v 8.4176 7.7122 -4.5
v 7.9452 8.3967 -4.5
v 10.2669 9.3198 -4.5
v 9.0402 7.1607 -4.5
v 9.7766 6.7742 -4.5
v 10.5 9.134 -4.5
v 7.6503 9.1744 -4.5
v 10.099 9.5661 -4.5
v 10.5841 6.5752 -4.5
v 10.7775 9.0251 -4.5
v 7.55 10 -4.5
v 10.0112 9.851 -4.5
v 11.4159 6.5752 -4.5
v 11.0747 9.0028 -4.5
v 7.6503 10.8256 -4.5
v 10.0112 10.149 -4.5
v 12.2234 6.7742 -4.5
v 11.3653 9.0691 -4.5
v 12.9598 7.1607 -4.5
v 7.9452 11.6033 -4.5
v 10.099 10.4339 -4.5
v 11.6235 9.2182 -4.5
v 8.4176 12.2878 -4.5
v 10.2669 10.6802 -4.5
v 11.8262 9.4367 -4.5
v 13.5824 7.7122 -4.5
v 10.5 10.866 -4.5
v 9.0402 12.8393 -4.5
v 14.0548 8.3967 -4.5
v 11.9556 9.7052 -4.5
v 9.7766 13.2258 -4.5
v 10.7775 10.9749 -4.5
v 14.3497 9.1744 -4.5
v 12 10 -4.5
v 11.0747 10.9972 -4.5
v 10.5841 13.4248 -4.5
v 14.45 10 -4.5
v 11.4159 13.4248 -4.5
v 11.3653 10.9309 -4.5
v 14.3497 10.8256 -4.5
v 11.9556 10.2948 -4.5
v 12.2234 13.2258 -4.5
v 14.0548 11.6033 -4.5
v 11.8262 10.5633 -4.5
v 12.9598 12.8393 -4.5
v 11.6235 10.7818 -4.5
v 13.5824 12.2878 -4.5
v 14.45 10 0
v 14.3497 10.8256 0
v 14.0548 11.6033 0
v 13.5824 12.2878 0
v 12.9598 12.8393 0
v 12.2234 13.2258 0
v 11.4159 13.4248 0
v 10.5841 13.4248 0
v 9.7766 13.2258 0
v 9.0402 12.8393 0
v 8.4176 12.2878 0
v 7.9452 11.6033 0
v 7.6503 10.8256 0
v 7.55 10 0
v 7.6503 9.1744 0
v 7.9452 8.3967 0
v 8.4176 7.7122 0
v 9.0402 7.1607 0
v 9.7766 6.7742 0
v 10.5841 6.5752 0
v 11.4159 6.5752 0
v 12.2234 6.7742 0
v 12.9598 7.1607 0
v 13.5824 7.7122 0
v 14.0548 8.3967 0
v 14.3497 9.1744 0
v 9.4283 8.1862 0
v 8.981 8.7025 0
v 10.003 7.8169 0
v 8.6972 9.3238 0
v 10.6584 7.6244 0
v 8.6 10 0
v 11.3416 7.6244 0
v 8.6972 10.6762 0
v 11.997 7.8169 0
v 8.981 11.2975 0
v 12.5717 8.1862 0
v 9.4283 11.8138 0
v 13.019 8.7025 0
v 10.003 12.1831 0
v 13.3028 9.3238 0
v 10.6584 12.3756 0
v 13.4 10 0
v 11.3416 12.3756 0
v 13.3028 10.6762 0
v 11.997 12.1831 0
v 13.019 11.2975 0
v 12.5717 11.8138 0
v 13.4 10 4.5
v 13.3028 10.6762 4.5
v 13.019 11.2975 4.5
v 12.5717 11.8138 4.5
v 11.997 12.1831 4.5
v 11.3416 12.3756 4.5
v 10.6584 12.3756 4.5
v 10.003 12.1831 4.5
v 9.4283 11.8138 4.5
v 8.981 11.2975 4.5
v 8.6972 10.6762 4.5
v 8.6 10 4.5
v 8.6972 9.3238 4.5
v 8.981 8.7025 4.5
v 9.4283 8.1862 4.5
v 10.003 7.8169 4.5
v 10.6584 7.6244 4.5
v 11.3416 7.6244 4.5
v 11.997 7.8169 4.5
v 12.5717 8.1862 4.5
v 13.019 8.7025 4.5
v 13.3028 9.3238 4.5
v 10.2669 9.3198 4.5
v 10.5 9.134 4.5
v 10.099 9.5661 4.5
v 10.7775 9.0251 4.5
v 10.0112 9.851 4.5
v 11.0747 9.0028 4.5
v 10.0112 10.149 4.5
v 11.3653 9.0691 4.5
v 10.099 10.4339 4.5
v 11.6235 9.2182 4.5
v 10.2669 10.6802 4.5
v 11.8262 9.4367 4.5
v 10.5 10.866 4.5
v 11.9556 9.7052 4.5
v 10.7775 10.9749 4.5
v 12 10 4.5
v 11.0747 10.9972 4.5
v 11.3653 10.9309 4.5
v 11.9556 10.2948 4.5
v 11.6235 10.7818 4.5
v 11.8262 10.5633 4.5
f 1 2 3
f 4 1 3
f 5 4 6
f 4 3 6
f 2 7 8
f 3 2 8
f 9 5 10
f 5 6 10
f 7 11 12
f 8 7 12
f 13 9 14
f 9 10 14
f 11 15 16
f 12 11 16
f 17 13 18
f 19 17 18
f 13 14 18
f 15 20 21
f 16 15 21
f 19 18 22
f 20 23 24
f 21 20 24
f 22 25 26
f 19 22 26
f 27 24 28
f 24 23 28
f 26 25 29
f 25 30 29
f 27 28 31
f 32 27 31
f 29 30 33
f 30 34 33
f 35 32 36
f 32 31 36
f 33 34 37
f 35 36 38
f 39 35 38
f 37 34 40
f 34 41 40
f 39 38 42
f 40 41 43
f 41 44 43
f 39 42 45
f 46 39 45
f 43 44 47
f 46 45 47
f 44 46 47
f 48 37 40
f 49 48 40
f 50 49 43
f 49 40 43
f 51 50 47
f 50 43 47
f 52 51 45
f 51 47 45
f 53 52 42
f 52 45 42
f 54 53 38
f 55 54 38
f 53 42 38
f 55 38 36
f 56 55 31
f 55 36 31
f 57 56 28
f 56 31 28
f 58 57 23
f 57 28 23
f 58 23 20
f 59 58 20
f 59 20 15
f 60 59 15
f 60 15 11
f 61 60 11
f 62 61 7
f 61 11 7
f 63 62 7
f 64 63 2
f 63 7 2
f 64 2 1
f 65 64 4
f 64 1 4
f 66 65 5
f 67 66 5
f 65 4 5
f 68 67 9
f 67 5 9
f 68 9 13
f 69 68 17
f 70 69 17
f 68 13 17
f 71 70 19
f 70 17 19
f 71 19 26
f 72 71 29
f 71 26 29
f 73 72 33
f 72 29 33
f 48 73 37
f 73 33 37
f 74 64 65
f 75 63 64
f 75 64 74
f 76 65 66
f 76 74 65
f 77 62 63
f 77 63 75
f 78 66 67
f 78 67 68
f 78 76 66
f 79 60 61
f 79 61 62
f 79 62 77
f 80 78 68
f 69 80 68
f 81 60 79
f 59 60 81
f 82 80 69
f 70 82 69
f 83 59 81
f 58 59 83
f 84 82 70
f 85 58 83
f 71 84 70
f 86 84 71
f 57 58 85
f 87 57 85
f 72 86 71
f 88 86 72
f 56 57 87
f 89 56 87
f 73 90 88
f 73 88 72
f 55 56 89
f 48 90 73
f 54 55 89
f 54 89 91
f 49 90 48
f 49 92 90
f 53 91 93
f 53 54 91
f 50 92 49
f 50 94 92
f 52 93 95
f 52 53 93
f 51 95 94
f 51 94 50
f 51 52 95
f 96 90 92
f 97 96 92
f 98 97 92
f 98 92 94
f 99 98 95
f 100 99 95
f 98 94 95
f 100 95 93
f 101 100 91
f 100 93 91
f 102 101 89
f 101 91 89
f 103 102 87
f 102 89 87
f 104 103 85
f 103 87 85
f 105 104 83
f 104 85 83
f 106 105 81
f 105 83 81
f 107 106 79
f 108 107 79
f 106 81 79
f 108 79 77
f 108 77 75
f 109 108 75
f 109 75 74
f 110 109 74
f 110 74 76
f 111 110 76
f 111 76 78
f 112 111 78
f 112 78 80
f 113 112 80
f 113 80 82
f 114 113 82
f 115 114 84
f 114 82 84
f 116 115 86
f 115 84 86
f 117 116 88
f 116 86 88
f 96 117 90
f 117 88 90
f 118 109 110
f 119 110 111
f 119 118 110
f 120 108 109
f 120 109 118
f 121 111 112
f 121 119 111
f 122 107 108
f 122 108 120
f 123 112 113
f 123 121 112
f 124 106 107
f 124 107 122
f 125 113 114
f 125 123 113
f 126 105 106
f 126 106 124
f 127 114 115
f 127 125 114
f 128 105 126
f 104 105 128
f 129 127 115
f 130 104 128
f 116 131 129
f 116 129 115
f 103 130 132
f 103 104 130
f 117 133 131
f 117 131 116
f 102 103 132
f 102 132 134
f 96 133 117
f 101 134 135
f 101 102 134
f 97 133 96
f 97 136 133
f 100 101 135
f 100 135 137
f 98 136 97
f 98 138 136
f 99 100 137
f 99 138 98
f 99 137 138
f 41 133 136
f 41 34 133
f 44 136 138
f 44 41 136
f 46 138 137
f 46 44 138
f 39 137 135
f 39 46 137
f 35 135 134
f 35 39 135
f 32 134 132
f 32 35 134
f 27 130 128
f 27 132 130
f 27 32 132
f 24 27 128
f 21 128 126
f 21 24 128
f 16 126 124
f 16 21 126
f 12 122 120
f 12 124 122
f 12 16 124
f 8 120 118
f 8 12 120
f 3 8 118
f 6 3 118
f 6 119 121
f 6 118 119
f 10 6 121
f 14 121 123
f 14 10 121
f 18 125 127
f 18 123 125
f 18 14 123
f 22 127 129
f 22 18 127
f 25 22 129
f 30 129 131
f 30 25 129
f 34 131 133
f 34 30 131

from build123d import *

# Parameters (mm, degrees)
CYLINDER003006_R     = 1
CYLINDER003006_DEPTH = 20
CYLINDER003003_R     = 2.4
CYLINDER003003_DEPTH = 4.5
CYLINDER003005_R     = 3.45
CYLINDER003005_DEPTH = 4.5


with BuildPart() as cylinder007:
    # Cylinder003006 → Cylinder003006 (new body)
    with BuildSketch(Plane(origin=(11, 10, -8), x_dir=(1, 0, 0), z_dir=(0, 0, 1))):
        Circle(CYLINDER003006_R)
    extrude(amount=CYLINDER003006_DEPTH)


with BuildPart() as cut002002002013:
    # Cylinder003003 → Cylinder003003 (new body)
    with BuildSketch(Plane(origin=(11, 10, -0.5), x_dir=(1, 0, 0), z_dir=(0, 0, 1))):
        Circle(CYLINDER003003_R)
    extrude(amount=CYLINDER003003_DEPTH)

    # Cut002002002013: cut Cylinder007
    add(cylinder007.part, mode=Mode.SUBTRACT)


with BuildPart() as propeller_hub_old:
    # Cylinder003005 → Cylinder003005 (new body)
    with BuildSketch(Plane(origin=(11, 10, -5), x_dir=(1, 0, 0), z_dir=(0, 0, 1))):
        Circle(CYLINDER003005_R)
    extrude(amount=CYLINDER003005_DEPTH)

    # Cut002002002012: cut Cylinder007
    add(cylinder007.part, mode=Mode.SUBTRACT)

    # Connect006: union Cut002002002013
    add(cut002002002013.part)


with BuildPart() as propeller_hub_old_1:
    # Connect006 placement: moved
    add(propeller_hub_old.part.moved(Location((0, 0, 0.5))))


solid = propeller_hub_old_1.part
